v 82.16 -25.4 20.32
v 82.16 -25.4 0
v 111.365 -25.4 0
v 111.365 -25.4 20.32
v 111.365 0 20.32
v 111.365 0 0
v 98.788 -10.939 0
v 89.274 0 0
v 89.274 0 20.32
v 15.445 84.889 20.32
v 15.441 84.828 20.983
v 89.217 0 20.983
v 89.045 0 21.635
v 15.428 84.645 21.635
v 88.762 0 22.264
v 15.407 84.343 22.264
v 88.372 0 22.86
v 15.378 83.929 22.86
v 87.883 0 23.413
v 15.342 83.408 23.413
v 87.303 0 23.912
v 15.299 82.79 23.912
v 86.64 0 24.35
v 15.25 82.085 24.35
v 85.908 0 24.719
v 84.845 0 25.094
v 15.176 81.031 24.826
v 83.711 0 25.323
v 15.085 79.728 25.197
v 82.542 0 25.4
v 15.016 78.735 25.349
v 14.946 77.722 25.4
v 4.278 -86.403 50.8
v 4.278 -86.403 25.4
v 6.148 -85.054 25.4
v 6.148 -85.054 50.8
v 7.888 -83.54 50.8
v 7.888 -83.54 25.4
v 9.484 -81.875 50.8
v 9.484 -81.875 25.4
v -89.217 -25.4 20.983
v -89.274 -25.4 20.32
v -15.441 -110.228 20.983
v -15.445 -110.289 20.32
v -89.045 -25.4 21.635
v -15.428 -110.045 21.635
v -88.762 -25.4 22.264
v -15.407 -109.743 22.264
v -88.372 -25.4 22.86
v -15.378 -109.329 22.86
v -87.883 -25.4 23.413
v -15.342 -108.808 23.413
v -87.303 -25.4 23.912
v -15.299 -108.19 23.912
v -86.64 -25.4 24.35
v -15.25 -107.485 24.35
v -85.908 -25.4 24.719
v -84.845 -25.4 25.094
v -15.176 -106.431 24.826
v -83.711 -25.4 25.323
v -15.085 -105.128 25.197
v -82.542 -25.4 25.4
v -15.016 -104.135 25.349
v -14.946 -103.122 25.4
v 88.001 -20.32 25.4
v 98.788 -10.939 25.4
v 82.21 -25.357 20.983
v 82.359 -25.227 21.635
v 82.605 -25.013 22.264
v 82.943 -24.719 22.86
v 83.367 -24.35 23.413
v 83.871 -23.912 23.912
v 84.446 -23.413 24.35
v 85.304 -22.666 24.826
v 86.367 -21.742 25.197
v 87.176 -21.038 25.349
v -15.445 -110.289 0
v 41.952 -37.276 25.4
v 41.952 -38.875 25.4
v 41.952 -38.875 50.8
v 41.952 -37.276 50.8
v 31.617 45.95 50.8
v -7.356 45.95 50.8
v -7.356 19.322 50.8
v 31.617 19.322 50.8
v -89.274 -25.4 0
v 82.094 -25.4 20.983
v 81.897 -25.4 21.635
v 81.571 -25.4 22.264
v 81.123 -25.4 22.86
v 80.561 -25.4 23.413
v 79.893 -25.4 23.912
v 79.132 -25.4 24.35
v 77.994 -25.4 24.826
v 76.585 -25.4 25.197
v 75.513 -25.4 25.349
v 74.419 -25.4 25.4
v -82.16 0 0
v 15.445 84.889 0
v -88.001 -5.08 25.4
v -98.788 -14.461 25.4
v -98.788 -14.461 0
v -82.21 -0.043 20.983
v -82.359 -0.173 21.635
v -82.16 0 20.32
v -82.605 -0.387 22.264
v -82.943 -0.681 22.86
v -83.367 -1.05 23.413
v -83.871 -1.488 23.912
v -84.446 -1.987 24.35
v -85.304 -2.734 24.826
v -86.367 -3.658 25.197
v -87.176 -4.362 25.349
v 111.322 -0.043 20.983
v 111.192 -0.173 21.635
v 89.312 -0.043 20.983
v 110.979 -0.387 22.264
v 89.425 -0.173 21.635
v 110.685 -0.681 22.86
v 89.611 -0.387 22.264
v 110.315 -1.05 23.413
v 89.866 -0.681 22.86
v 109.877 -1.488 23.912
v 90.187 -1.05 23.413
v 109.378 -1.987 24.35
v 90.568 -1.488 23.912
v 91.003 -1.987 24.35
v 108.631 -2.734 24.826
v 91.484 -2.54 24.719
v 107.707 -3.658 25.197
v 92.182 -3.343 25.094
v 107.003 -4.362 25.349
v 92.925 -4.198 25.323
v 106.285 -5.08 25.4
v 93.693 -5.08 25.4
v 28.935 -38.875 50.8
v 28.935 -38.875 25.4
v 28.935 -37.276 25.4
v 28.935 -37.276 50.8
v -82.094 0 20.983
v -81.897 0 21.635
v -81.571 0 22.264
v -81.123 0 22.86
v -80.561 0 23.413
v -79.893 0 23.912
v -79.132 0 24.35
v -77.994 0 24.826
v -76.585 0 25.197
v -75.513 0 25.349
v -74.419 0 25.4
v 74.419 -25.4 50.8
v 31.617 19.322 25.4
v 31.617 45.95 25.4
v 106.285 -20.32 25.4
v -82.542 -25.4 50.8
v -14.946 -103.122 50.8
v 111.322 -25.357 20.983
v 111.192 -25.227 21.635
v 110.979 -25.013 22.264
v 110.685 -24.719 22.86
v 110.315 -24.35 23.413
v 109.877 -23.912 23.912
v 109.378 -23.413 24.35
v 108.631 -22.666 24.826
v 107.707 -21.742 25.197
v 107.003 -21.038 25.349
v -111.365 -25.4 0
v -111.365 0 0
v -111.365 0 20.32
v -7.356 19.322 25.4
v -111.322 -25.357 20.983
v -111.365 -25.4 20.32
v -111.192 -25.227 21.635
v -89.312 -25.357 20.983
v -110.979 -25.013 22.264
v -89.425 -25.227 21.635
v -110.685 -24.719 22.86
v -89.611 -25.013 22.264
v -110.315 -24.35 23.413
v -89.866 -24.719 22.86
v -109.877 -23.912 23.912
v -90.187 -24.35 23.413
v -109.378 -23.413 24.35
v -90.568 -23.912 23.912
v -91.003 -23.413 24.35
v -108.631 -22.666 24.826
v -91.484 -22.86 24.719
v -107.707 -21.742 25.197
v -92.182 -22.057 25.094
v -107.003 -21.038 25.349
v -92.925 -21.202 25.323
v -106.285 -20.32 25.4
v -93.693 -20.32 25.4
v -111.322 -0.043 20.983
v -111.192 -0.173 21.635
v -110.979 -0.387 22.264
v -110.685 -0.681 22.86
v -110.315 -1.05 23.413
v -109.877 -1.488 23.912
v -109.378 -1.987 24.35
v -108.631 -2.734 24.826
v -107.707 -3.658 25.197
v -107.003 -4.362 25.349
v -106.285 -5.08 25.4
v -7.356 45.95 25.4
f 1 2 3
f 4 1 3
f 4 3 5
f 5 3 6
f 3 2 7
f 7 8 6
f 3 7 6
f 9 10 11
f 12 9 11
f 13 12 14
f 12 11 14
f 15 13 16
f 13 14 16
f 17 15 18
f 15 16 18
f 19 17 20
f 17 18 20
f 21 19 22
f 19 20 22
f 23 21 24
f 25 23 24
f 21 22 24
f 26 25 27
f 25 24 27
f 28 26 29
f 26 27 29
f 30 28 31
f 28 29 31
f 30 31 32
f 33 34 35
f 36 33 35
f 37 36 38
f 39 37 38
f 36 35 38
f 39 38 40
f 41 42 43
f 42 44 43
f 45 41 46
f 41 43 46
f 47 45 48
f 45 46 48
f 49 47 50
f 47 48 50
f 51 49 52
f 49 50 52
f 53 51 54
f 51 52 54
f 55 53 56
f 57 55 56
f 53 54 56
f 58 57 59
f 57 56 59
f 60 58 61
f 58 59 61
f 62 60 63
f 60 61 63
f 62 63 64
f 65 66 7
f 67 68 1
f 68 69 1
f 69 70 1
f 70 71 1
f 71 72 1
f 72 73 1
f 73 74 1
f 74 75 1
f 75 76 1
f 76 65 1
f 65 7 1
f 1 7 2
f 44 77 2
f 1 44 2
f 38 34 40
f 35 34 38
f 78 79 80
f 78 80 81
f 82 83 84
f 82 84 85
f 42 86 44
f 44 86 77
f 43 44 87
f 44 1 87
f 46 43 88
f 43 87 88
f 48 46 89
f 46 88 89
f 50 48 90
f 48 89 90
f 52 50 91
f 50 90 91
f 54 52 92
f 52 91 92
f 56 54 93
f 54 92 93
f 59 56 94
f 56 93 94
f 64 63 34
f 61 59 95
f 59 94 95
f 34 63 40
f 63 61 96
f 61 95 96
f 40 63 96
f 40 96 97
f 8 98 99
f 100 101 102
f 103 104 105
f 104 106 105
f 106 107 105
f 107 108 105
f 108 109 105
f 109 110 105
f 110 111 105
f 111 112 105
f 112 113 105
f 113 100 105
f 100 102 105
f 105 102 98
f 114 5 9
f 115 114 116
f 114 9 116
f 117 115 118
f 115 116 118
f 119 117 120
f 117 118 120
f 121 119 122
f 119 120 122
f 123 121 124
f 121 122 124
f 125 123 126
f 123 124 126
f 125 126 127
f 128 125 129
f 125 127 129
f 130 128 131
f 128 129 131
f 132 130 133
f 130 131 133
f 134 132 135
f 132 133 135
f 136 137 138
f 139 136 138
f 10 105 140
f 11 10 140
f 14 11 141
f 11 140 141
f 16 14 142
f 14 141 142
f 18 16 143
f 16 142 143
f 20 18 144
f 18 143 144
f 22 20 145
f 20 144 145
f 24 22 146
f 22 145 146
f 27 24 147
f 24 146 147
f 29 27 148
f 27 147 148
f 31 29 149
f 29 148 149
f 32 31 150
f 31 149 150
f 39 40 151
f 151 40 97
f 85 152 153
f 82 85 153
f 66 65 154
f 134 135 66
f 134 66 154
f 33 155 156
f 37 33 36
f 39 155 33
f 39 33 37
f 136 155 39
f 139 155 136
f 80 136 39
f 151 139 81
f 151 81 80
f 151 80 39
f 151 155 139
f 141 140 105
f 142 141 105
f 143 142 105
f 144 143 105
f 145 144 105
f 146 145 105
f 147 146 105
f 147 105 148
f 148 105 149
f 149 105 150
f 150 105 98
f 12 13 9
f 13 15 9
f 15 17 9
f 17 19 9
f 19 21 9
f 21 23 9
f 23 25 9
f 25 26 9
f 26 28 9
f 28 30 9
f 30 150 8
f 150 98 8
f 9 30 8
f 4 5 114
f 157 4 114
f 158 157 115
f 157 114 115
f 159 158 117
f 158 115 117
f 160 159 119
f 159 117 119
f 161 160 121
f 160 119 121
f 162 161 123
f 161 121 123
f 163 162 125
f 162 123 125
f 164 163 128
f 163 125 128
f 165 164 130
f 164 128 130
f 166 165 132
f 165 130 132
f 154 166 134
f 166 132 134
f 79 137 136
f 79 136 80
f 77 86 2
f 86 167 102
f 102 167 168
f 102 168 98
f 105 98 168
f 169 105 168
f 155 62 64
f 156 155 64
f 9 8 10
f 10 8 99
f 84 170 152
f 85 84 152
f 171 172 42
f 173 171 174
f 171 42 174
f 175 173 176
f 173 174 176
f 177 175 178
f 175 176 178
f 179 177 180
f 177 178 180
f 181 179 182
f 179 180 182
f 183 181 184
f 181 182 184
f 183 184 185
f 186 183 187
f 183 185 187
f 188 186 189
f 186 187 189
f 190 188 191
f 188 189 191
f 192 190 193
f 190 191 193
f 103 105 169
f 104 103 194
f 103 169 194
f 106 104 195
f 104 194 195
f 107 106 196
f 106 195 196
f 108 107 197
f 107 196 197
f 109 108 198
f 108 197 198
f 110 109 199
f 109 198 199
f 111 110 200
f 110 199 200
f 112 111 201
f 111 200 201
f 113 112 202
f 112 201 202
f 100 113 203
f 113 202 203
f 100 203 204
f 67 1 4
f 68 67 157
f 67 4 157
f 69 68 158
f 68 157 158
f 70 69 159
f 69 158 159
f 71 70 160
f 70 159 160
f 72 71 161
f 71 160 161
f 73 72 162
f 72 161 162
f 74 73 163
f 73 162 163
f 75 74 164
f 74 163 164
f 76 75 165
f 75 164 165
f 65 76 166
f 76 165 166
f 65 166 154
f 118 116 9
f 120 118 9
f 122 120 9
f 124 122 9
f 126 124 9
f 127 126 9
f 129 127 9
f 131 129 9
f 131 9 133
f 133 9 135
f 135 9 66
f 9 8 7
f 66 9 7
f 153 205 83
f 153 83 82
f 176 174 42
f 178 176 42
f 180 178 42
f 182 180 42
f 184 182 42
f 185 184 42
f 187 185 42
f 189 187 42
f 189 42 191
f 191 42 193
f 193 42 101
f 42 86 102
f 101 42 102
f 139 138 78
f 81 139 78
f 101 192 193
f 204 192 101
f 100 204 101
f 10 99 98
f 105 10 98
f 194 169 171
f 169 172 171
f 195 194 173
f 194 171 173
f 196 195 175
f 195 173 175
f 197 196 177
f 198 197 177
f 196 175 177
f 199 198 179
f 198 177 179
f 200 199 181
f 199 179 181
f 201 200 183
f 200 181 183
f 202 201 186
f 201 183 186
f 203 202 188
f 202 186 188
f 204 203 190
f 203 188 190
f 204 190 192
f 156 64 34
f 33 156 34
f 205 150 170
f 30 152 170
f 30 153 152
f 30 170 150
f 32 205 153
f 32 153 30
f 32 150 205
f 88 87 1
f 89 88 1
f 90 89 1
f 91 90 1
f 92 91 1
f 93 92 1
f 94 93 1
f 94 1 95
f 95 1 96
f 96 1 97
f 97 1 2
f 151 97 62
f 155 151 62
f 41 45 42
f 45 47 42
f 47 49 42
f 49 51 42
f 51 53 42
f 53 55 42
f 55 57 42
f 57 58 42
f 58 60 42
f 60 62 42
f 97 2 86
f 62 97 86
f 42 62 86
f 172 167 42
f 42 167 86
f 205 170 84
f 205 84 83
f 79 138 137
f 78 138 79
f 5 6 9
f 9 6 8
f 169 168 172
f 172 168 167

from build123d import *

# Parameters (mm, degrees)
F1_DEPTH = 25.4
F2_R     = 5.08
F2_2_R   = 5.08
F2_3_R   = 5.08
F2_4_R   = 5.08
F3_R     = 25.4
F4_DEPTH = 25.4
F5_W     = 38.972184062
F5_H     = 26.6281440854
F6_DEPTH = 25.4
F7_W     = 13.0164770336
F7_H     = 1.5988759696
F8_DEPTH = 25.4


with BuildPart() as f1:
    # F0 (on Top) → F1 (new body)
    with BuildSketch(Plane.XY):
        Polygon((-111.3652590445, 0), (-111.3652590445, -25.4), (-89.2744497164, -25.4), (-98.7879901342, -14.4613366391), (-82.1603534924, 0), align=None)
    extrude(amount=F1_DEPTH)

    # F2#4
    f2_4_edges = [f1.edges().sort_by_distance(p)[0] for p in [
        (-96.762806, 0, 25.4),
        (-111.365259, -12.7, 25.4),
        (-100.319854, -25.4, 25.4),
    ]]
    fillet(f2_4_edges, radius=F2_4_R)


with BuildPart() as f1b:
    # F0 (on Top) → F1, piece 2 (new body)
    with BuildSketch(Plane.XY):
        Polygon((98.7879901342, -10.9386633609), (82.1603534924, -25.4), (111.3652590445, -25.4), (111.3652590445, 0), (89.2744497164, 0), align=None)
    extrude(amount=F1_DEPTH)

    # F2#2
    f2_2_edges = [f1b.edges().sort_by_distance(p)[0] for p in [
        (96.762806, -25.4, 25.4),
        (111.365259, -12.7, 25.4),
        (100.319854, 0, 25.4),
    ]]
    fillet(f2_2_edges, radius=F2_2_R)


with BuildPart() as f1c:
    # F0 (on Top) → F1, piece 3 (new body)
    with BuildSketch(Plane.XY):
        Polygon((15.4450166199, 84.8890401793), (-82.1603534924, 0), (89.2744497164, 0), align=None)
    extrude(amount=F1_DEPTH)

    # F2#3
    f2_3_edges = [f1c.edges().sort_by_distance(p)[0] for p in [
        (52.359733, 42.44452, 25.4),
        (-33.357668, 42.44452, 25.4),
    ]]
    fillet(f2_3_edges, radius=F2_3_R)

    # F5 (on face) → F6 (join)
    with BuildSketch(Plane.XY.offset(25.4)):
        with Locations((12.1304392815, 32.6356142759)):
            Rectangle(F5_W, F5_H)
    extrude(amount=F6_DEPTH)


with BuildPart() as f1d:
    # F0 (on Top) → F1, piece 4 (new body)
    with BuildSketch(Plane.XY):
        Polygon((82.1603534924, -25.4), (-89.2744497164, -25.4), (-15.4450166199, -110.2890401793), align=None)
    extrude(amount=F1_DEPTH)

    # F2
    f2_edges = [f1d.edges().sort_by_distance(p)[0] for p in [
        (-52.359733, -67.84452, 25.4),
        (33.357668, -67.84452, 25.4),
    ]]
    fillet(f2_edges, radius=F2_R)

    # F3 (on face) → F4 (join)
    with BuildSketch(Plane.XY.offset(25.4)):
        with Locations((-9.6331909299, -65.1513114572)):
            Circle(F3_R)
    extrude(amount=F4_DEPTH)

    # F7 (on face) → F8 (join)
    with BuildSketch(Plane.XY.offset(25.4)):
        with BuildLine():
            ThreePointArc((15.7668090701, -65.1513114572), (14.1442678294, -74.0839737116), (9.4839386014, -81.8754066041))
            Line((9.4839386014, -81.8754066041), (74.4193289909, -25.4))
            Line((74.4193289909, -25.4), (-82.5419498634, -25.4))
            Line((-82.5419498634, -25.4), (-14.9456274188, -103.1222130971))
            Line((-14.9456274188, -103.1222130971), (4.2779697999, -86.4031256656))
            ThreePointArc((4.2779697999, -86.4031256656), (-31.9771328665, -53.0720623608), (15.7668090701, -65.1513114572))
        make_face()
        with Locations((35.4433952794, -38.0758401006)):
            Rectangle(F7_W, F7_H, mode=Mode.SUBTRACT)
    extrude(amount=F8_DEPTH)


solid = Compound([f1.part, f1b.part, f1c.part, f1d.part])
